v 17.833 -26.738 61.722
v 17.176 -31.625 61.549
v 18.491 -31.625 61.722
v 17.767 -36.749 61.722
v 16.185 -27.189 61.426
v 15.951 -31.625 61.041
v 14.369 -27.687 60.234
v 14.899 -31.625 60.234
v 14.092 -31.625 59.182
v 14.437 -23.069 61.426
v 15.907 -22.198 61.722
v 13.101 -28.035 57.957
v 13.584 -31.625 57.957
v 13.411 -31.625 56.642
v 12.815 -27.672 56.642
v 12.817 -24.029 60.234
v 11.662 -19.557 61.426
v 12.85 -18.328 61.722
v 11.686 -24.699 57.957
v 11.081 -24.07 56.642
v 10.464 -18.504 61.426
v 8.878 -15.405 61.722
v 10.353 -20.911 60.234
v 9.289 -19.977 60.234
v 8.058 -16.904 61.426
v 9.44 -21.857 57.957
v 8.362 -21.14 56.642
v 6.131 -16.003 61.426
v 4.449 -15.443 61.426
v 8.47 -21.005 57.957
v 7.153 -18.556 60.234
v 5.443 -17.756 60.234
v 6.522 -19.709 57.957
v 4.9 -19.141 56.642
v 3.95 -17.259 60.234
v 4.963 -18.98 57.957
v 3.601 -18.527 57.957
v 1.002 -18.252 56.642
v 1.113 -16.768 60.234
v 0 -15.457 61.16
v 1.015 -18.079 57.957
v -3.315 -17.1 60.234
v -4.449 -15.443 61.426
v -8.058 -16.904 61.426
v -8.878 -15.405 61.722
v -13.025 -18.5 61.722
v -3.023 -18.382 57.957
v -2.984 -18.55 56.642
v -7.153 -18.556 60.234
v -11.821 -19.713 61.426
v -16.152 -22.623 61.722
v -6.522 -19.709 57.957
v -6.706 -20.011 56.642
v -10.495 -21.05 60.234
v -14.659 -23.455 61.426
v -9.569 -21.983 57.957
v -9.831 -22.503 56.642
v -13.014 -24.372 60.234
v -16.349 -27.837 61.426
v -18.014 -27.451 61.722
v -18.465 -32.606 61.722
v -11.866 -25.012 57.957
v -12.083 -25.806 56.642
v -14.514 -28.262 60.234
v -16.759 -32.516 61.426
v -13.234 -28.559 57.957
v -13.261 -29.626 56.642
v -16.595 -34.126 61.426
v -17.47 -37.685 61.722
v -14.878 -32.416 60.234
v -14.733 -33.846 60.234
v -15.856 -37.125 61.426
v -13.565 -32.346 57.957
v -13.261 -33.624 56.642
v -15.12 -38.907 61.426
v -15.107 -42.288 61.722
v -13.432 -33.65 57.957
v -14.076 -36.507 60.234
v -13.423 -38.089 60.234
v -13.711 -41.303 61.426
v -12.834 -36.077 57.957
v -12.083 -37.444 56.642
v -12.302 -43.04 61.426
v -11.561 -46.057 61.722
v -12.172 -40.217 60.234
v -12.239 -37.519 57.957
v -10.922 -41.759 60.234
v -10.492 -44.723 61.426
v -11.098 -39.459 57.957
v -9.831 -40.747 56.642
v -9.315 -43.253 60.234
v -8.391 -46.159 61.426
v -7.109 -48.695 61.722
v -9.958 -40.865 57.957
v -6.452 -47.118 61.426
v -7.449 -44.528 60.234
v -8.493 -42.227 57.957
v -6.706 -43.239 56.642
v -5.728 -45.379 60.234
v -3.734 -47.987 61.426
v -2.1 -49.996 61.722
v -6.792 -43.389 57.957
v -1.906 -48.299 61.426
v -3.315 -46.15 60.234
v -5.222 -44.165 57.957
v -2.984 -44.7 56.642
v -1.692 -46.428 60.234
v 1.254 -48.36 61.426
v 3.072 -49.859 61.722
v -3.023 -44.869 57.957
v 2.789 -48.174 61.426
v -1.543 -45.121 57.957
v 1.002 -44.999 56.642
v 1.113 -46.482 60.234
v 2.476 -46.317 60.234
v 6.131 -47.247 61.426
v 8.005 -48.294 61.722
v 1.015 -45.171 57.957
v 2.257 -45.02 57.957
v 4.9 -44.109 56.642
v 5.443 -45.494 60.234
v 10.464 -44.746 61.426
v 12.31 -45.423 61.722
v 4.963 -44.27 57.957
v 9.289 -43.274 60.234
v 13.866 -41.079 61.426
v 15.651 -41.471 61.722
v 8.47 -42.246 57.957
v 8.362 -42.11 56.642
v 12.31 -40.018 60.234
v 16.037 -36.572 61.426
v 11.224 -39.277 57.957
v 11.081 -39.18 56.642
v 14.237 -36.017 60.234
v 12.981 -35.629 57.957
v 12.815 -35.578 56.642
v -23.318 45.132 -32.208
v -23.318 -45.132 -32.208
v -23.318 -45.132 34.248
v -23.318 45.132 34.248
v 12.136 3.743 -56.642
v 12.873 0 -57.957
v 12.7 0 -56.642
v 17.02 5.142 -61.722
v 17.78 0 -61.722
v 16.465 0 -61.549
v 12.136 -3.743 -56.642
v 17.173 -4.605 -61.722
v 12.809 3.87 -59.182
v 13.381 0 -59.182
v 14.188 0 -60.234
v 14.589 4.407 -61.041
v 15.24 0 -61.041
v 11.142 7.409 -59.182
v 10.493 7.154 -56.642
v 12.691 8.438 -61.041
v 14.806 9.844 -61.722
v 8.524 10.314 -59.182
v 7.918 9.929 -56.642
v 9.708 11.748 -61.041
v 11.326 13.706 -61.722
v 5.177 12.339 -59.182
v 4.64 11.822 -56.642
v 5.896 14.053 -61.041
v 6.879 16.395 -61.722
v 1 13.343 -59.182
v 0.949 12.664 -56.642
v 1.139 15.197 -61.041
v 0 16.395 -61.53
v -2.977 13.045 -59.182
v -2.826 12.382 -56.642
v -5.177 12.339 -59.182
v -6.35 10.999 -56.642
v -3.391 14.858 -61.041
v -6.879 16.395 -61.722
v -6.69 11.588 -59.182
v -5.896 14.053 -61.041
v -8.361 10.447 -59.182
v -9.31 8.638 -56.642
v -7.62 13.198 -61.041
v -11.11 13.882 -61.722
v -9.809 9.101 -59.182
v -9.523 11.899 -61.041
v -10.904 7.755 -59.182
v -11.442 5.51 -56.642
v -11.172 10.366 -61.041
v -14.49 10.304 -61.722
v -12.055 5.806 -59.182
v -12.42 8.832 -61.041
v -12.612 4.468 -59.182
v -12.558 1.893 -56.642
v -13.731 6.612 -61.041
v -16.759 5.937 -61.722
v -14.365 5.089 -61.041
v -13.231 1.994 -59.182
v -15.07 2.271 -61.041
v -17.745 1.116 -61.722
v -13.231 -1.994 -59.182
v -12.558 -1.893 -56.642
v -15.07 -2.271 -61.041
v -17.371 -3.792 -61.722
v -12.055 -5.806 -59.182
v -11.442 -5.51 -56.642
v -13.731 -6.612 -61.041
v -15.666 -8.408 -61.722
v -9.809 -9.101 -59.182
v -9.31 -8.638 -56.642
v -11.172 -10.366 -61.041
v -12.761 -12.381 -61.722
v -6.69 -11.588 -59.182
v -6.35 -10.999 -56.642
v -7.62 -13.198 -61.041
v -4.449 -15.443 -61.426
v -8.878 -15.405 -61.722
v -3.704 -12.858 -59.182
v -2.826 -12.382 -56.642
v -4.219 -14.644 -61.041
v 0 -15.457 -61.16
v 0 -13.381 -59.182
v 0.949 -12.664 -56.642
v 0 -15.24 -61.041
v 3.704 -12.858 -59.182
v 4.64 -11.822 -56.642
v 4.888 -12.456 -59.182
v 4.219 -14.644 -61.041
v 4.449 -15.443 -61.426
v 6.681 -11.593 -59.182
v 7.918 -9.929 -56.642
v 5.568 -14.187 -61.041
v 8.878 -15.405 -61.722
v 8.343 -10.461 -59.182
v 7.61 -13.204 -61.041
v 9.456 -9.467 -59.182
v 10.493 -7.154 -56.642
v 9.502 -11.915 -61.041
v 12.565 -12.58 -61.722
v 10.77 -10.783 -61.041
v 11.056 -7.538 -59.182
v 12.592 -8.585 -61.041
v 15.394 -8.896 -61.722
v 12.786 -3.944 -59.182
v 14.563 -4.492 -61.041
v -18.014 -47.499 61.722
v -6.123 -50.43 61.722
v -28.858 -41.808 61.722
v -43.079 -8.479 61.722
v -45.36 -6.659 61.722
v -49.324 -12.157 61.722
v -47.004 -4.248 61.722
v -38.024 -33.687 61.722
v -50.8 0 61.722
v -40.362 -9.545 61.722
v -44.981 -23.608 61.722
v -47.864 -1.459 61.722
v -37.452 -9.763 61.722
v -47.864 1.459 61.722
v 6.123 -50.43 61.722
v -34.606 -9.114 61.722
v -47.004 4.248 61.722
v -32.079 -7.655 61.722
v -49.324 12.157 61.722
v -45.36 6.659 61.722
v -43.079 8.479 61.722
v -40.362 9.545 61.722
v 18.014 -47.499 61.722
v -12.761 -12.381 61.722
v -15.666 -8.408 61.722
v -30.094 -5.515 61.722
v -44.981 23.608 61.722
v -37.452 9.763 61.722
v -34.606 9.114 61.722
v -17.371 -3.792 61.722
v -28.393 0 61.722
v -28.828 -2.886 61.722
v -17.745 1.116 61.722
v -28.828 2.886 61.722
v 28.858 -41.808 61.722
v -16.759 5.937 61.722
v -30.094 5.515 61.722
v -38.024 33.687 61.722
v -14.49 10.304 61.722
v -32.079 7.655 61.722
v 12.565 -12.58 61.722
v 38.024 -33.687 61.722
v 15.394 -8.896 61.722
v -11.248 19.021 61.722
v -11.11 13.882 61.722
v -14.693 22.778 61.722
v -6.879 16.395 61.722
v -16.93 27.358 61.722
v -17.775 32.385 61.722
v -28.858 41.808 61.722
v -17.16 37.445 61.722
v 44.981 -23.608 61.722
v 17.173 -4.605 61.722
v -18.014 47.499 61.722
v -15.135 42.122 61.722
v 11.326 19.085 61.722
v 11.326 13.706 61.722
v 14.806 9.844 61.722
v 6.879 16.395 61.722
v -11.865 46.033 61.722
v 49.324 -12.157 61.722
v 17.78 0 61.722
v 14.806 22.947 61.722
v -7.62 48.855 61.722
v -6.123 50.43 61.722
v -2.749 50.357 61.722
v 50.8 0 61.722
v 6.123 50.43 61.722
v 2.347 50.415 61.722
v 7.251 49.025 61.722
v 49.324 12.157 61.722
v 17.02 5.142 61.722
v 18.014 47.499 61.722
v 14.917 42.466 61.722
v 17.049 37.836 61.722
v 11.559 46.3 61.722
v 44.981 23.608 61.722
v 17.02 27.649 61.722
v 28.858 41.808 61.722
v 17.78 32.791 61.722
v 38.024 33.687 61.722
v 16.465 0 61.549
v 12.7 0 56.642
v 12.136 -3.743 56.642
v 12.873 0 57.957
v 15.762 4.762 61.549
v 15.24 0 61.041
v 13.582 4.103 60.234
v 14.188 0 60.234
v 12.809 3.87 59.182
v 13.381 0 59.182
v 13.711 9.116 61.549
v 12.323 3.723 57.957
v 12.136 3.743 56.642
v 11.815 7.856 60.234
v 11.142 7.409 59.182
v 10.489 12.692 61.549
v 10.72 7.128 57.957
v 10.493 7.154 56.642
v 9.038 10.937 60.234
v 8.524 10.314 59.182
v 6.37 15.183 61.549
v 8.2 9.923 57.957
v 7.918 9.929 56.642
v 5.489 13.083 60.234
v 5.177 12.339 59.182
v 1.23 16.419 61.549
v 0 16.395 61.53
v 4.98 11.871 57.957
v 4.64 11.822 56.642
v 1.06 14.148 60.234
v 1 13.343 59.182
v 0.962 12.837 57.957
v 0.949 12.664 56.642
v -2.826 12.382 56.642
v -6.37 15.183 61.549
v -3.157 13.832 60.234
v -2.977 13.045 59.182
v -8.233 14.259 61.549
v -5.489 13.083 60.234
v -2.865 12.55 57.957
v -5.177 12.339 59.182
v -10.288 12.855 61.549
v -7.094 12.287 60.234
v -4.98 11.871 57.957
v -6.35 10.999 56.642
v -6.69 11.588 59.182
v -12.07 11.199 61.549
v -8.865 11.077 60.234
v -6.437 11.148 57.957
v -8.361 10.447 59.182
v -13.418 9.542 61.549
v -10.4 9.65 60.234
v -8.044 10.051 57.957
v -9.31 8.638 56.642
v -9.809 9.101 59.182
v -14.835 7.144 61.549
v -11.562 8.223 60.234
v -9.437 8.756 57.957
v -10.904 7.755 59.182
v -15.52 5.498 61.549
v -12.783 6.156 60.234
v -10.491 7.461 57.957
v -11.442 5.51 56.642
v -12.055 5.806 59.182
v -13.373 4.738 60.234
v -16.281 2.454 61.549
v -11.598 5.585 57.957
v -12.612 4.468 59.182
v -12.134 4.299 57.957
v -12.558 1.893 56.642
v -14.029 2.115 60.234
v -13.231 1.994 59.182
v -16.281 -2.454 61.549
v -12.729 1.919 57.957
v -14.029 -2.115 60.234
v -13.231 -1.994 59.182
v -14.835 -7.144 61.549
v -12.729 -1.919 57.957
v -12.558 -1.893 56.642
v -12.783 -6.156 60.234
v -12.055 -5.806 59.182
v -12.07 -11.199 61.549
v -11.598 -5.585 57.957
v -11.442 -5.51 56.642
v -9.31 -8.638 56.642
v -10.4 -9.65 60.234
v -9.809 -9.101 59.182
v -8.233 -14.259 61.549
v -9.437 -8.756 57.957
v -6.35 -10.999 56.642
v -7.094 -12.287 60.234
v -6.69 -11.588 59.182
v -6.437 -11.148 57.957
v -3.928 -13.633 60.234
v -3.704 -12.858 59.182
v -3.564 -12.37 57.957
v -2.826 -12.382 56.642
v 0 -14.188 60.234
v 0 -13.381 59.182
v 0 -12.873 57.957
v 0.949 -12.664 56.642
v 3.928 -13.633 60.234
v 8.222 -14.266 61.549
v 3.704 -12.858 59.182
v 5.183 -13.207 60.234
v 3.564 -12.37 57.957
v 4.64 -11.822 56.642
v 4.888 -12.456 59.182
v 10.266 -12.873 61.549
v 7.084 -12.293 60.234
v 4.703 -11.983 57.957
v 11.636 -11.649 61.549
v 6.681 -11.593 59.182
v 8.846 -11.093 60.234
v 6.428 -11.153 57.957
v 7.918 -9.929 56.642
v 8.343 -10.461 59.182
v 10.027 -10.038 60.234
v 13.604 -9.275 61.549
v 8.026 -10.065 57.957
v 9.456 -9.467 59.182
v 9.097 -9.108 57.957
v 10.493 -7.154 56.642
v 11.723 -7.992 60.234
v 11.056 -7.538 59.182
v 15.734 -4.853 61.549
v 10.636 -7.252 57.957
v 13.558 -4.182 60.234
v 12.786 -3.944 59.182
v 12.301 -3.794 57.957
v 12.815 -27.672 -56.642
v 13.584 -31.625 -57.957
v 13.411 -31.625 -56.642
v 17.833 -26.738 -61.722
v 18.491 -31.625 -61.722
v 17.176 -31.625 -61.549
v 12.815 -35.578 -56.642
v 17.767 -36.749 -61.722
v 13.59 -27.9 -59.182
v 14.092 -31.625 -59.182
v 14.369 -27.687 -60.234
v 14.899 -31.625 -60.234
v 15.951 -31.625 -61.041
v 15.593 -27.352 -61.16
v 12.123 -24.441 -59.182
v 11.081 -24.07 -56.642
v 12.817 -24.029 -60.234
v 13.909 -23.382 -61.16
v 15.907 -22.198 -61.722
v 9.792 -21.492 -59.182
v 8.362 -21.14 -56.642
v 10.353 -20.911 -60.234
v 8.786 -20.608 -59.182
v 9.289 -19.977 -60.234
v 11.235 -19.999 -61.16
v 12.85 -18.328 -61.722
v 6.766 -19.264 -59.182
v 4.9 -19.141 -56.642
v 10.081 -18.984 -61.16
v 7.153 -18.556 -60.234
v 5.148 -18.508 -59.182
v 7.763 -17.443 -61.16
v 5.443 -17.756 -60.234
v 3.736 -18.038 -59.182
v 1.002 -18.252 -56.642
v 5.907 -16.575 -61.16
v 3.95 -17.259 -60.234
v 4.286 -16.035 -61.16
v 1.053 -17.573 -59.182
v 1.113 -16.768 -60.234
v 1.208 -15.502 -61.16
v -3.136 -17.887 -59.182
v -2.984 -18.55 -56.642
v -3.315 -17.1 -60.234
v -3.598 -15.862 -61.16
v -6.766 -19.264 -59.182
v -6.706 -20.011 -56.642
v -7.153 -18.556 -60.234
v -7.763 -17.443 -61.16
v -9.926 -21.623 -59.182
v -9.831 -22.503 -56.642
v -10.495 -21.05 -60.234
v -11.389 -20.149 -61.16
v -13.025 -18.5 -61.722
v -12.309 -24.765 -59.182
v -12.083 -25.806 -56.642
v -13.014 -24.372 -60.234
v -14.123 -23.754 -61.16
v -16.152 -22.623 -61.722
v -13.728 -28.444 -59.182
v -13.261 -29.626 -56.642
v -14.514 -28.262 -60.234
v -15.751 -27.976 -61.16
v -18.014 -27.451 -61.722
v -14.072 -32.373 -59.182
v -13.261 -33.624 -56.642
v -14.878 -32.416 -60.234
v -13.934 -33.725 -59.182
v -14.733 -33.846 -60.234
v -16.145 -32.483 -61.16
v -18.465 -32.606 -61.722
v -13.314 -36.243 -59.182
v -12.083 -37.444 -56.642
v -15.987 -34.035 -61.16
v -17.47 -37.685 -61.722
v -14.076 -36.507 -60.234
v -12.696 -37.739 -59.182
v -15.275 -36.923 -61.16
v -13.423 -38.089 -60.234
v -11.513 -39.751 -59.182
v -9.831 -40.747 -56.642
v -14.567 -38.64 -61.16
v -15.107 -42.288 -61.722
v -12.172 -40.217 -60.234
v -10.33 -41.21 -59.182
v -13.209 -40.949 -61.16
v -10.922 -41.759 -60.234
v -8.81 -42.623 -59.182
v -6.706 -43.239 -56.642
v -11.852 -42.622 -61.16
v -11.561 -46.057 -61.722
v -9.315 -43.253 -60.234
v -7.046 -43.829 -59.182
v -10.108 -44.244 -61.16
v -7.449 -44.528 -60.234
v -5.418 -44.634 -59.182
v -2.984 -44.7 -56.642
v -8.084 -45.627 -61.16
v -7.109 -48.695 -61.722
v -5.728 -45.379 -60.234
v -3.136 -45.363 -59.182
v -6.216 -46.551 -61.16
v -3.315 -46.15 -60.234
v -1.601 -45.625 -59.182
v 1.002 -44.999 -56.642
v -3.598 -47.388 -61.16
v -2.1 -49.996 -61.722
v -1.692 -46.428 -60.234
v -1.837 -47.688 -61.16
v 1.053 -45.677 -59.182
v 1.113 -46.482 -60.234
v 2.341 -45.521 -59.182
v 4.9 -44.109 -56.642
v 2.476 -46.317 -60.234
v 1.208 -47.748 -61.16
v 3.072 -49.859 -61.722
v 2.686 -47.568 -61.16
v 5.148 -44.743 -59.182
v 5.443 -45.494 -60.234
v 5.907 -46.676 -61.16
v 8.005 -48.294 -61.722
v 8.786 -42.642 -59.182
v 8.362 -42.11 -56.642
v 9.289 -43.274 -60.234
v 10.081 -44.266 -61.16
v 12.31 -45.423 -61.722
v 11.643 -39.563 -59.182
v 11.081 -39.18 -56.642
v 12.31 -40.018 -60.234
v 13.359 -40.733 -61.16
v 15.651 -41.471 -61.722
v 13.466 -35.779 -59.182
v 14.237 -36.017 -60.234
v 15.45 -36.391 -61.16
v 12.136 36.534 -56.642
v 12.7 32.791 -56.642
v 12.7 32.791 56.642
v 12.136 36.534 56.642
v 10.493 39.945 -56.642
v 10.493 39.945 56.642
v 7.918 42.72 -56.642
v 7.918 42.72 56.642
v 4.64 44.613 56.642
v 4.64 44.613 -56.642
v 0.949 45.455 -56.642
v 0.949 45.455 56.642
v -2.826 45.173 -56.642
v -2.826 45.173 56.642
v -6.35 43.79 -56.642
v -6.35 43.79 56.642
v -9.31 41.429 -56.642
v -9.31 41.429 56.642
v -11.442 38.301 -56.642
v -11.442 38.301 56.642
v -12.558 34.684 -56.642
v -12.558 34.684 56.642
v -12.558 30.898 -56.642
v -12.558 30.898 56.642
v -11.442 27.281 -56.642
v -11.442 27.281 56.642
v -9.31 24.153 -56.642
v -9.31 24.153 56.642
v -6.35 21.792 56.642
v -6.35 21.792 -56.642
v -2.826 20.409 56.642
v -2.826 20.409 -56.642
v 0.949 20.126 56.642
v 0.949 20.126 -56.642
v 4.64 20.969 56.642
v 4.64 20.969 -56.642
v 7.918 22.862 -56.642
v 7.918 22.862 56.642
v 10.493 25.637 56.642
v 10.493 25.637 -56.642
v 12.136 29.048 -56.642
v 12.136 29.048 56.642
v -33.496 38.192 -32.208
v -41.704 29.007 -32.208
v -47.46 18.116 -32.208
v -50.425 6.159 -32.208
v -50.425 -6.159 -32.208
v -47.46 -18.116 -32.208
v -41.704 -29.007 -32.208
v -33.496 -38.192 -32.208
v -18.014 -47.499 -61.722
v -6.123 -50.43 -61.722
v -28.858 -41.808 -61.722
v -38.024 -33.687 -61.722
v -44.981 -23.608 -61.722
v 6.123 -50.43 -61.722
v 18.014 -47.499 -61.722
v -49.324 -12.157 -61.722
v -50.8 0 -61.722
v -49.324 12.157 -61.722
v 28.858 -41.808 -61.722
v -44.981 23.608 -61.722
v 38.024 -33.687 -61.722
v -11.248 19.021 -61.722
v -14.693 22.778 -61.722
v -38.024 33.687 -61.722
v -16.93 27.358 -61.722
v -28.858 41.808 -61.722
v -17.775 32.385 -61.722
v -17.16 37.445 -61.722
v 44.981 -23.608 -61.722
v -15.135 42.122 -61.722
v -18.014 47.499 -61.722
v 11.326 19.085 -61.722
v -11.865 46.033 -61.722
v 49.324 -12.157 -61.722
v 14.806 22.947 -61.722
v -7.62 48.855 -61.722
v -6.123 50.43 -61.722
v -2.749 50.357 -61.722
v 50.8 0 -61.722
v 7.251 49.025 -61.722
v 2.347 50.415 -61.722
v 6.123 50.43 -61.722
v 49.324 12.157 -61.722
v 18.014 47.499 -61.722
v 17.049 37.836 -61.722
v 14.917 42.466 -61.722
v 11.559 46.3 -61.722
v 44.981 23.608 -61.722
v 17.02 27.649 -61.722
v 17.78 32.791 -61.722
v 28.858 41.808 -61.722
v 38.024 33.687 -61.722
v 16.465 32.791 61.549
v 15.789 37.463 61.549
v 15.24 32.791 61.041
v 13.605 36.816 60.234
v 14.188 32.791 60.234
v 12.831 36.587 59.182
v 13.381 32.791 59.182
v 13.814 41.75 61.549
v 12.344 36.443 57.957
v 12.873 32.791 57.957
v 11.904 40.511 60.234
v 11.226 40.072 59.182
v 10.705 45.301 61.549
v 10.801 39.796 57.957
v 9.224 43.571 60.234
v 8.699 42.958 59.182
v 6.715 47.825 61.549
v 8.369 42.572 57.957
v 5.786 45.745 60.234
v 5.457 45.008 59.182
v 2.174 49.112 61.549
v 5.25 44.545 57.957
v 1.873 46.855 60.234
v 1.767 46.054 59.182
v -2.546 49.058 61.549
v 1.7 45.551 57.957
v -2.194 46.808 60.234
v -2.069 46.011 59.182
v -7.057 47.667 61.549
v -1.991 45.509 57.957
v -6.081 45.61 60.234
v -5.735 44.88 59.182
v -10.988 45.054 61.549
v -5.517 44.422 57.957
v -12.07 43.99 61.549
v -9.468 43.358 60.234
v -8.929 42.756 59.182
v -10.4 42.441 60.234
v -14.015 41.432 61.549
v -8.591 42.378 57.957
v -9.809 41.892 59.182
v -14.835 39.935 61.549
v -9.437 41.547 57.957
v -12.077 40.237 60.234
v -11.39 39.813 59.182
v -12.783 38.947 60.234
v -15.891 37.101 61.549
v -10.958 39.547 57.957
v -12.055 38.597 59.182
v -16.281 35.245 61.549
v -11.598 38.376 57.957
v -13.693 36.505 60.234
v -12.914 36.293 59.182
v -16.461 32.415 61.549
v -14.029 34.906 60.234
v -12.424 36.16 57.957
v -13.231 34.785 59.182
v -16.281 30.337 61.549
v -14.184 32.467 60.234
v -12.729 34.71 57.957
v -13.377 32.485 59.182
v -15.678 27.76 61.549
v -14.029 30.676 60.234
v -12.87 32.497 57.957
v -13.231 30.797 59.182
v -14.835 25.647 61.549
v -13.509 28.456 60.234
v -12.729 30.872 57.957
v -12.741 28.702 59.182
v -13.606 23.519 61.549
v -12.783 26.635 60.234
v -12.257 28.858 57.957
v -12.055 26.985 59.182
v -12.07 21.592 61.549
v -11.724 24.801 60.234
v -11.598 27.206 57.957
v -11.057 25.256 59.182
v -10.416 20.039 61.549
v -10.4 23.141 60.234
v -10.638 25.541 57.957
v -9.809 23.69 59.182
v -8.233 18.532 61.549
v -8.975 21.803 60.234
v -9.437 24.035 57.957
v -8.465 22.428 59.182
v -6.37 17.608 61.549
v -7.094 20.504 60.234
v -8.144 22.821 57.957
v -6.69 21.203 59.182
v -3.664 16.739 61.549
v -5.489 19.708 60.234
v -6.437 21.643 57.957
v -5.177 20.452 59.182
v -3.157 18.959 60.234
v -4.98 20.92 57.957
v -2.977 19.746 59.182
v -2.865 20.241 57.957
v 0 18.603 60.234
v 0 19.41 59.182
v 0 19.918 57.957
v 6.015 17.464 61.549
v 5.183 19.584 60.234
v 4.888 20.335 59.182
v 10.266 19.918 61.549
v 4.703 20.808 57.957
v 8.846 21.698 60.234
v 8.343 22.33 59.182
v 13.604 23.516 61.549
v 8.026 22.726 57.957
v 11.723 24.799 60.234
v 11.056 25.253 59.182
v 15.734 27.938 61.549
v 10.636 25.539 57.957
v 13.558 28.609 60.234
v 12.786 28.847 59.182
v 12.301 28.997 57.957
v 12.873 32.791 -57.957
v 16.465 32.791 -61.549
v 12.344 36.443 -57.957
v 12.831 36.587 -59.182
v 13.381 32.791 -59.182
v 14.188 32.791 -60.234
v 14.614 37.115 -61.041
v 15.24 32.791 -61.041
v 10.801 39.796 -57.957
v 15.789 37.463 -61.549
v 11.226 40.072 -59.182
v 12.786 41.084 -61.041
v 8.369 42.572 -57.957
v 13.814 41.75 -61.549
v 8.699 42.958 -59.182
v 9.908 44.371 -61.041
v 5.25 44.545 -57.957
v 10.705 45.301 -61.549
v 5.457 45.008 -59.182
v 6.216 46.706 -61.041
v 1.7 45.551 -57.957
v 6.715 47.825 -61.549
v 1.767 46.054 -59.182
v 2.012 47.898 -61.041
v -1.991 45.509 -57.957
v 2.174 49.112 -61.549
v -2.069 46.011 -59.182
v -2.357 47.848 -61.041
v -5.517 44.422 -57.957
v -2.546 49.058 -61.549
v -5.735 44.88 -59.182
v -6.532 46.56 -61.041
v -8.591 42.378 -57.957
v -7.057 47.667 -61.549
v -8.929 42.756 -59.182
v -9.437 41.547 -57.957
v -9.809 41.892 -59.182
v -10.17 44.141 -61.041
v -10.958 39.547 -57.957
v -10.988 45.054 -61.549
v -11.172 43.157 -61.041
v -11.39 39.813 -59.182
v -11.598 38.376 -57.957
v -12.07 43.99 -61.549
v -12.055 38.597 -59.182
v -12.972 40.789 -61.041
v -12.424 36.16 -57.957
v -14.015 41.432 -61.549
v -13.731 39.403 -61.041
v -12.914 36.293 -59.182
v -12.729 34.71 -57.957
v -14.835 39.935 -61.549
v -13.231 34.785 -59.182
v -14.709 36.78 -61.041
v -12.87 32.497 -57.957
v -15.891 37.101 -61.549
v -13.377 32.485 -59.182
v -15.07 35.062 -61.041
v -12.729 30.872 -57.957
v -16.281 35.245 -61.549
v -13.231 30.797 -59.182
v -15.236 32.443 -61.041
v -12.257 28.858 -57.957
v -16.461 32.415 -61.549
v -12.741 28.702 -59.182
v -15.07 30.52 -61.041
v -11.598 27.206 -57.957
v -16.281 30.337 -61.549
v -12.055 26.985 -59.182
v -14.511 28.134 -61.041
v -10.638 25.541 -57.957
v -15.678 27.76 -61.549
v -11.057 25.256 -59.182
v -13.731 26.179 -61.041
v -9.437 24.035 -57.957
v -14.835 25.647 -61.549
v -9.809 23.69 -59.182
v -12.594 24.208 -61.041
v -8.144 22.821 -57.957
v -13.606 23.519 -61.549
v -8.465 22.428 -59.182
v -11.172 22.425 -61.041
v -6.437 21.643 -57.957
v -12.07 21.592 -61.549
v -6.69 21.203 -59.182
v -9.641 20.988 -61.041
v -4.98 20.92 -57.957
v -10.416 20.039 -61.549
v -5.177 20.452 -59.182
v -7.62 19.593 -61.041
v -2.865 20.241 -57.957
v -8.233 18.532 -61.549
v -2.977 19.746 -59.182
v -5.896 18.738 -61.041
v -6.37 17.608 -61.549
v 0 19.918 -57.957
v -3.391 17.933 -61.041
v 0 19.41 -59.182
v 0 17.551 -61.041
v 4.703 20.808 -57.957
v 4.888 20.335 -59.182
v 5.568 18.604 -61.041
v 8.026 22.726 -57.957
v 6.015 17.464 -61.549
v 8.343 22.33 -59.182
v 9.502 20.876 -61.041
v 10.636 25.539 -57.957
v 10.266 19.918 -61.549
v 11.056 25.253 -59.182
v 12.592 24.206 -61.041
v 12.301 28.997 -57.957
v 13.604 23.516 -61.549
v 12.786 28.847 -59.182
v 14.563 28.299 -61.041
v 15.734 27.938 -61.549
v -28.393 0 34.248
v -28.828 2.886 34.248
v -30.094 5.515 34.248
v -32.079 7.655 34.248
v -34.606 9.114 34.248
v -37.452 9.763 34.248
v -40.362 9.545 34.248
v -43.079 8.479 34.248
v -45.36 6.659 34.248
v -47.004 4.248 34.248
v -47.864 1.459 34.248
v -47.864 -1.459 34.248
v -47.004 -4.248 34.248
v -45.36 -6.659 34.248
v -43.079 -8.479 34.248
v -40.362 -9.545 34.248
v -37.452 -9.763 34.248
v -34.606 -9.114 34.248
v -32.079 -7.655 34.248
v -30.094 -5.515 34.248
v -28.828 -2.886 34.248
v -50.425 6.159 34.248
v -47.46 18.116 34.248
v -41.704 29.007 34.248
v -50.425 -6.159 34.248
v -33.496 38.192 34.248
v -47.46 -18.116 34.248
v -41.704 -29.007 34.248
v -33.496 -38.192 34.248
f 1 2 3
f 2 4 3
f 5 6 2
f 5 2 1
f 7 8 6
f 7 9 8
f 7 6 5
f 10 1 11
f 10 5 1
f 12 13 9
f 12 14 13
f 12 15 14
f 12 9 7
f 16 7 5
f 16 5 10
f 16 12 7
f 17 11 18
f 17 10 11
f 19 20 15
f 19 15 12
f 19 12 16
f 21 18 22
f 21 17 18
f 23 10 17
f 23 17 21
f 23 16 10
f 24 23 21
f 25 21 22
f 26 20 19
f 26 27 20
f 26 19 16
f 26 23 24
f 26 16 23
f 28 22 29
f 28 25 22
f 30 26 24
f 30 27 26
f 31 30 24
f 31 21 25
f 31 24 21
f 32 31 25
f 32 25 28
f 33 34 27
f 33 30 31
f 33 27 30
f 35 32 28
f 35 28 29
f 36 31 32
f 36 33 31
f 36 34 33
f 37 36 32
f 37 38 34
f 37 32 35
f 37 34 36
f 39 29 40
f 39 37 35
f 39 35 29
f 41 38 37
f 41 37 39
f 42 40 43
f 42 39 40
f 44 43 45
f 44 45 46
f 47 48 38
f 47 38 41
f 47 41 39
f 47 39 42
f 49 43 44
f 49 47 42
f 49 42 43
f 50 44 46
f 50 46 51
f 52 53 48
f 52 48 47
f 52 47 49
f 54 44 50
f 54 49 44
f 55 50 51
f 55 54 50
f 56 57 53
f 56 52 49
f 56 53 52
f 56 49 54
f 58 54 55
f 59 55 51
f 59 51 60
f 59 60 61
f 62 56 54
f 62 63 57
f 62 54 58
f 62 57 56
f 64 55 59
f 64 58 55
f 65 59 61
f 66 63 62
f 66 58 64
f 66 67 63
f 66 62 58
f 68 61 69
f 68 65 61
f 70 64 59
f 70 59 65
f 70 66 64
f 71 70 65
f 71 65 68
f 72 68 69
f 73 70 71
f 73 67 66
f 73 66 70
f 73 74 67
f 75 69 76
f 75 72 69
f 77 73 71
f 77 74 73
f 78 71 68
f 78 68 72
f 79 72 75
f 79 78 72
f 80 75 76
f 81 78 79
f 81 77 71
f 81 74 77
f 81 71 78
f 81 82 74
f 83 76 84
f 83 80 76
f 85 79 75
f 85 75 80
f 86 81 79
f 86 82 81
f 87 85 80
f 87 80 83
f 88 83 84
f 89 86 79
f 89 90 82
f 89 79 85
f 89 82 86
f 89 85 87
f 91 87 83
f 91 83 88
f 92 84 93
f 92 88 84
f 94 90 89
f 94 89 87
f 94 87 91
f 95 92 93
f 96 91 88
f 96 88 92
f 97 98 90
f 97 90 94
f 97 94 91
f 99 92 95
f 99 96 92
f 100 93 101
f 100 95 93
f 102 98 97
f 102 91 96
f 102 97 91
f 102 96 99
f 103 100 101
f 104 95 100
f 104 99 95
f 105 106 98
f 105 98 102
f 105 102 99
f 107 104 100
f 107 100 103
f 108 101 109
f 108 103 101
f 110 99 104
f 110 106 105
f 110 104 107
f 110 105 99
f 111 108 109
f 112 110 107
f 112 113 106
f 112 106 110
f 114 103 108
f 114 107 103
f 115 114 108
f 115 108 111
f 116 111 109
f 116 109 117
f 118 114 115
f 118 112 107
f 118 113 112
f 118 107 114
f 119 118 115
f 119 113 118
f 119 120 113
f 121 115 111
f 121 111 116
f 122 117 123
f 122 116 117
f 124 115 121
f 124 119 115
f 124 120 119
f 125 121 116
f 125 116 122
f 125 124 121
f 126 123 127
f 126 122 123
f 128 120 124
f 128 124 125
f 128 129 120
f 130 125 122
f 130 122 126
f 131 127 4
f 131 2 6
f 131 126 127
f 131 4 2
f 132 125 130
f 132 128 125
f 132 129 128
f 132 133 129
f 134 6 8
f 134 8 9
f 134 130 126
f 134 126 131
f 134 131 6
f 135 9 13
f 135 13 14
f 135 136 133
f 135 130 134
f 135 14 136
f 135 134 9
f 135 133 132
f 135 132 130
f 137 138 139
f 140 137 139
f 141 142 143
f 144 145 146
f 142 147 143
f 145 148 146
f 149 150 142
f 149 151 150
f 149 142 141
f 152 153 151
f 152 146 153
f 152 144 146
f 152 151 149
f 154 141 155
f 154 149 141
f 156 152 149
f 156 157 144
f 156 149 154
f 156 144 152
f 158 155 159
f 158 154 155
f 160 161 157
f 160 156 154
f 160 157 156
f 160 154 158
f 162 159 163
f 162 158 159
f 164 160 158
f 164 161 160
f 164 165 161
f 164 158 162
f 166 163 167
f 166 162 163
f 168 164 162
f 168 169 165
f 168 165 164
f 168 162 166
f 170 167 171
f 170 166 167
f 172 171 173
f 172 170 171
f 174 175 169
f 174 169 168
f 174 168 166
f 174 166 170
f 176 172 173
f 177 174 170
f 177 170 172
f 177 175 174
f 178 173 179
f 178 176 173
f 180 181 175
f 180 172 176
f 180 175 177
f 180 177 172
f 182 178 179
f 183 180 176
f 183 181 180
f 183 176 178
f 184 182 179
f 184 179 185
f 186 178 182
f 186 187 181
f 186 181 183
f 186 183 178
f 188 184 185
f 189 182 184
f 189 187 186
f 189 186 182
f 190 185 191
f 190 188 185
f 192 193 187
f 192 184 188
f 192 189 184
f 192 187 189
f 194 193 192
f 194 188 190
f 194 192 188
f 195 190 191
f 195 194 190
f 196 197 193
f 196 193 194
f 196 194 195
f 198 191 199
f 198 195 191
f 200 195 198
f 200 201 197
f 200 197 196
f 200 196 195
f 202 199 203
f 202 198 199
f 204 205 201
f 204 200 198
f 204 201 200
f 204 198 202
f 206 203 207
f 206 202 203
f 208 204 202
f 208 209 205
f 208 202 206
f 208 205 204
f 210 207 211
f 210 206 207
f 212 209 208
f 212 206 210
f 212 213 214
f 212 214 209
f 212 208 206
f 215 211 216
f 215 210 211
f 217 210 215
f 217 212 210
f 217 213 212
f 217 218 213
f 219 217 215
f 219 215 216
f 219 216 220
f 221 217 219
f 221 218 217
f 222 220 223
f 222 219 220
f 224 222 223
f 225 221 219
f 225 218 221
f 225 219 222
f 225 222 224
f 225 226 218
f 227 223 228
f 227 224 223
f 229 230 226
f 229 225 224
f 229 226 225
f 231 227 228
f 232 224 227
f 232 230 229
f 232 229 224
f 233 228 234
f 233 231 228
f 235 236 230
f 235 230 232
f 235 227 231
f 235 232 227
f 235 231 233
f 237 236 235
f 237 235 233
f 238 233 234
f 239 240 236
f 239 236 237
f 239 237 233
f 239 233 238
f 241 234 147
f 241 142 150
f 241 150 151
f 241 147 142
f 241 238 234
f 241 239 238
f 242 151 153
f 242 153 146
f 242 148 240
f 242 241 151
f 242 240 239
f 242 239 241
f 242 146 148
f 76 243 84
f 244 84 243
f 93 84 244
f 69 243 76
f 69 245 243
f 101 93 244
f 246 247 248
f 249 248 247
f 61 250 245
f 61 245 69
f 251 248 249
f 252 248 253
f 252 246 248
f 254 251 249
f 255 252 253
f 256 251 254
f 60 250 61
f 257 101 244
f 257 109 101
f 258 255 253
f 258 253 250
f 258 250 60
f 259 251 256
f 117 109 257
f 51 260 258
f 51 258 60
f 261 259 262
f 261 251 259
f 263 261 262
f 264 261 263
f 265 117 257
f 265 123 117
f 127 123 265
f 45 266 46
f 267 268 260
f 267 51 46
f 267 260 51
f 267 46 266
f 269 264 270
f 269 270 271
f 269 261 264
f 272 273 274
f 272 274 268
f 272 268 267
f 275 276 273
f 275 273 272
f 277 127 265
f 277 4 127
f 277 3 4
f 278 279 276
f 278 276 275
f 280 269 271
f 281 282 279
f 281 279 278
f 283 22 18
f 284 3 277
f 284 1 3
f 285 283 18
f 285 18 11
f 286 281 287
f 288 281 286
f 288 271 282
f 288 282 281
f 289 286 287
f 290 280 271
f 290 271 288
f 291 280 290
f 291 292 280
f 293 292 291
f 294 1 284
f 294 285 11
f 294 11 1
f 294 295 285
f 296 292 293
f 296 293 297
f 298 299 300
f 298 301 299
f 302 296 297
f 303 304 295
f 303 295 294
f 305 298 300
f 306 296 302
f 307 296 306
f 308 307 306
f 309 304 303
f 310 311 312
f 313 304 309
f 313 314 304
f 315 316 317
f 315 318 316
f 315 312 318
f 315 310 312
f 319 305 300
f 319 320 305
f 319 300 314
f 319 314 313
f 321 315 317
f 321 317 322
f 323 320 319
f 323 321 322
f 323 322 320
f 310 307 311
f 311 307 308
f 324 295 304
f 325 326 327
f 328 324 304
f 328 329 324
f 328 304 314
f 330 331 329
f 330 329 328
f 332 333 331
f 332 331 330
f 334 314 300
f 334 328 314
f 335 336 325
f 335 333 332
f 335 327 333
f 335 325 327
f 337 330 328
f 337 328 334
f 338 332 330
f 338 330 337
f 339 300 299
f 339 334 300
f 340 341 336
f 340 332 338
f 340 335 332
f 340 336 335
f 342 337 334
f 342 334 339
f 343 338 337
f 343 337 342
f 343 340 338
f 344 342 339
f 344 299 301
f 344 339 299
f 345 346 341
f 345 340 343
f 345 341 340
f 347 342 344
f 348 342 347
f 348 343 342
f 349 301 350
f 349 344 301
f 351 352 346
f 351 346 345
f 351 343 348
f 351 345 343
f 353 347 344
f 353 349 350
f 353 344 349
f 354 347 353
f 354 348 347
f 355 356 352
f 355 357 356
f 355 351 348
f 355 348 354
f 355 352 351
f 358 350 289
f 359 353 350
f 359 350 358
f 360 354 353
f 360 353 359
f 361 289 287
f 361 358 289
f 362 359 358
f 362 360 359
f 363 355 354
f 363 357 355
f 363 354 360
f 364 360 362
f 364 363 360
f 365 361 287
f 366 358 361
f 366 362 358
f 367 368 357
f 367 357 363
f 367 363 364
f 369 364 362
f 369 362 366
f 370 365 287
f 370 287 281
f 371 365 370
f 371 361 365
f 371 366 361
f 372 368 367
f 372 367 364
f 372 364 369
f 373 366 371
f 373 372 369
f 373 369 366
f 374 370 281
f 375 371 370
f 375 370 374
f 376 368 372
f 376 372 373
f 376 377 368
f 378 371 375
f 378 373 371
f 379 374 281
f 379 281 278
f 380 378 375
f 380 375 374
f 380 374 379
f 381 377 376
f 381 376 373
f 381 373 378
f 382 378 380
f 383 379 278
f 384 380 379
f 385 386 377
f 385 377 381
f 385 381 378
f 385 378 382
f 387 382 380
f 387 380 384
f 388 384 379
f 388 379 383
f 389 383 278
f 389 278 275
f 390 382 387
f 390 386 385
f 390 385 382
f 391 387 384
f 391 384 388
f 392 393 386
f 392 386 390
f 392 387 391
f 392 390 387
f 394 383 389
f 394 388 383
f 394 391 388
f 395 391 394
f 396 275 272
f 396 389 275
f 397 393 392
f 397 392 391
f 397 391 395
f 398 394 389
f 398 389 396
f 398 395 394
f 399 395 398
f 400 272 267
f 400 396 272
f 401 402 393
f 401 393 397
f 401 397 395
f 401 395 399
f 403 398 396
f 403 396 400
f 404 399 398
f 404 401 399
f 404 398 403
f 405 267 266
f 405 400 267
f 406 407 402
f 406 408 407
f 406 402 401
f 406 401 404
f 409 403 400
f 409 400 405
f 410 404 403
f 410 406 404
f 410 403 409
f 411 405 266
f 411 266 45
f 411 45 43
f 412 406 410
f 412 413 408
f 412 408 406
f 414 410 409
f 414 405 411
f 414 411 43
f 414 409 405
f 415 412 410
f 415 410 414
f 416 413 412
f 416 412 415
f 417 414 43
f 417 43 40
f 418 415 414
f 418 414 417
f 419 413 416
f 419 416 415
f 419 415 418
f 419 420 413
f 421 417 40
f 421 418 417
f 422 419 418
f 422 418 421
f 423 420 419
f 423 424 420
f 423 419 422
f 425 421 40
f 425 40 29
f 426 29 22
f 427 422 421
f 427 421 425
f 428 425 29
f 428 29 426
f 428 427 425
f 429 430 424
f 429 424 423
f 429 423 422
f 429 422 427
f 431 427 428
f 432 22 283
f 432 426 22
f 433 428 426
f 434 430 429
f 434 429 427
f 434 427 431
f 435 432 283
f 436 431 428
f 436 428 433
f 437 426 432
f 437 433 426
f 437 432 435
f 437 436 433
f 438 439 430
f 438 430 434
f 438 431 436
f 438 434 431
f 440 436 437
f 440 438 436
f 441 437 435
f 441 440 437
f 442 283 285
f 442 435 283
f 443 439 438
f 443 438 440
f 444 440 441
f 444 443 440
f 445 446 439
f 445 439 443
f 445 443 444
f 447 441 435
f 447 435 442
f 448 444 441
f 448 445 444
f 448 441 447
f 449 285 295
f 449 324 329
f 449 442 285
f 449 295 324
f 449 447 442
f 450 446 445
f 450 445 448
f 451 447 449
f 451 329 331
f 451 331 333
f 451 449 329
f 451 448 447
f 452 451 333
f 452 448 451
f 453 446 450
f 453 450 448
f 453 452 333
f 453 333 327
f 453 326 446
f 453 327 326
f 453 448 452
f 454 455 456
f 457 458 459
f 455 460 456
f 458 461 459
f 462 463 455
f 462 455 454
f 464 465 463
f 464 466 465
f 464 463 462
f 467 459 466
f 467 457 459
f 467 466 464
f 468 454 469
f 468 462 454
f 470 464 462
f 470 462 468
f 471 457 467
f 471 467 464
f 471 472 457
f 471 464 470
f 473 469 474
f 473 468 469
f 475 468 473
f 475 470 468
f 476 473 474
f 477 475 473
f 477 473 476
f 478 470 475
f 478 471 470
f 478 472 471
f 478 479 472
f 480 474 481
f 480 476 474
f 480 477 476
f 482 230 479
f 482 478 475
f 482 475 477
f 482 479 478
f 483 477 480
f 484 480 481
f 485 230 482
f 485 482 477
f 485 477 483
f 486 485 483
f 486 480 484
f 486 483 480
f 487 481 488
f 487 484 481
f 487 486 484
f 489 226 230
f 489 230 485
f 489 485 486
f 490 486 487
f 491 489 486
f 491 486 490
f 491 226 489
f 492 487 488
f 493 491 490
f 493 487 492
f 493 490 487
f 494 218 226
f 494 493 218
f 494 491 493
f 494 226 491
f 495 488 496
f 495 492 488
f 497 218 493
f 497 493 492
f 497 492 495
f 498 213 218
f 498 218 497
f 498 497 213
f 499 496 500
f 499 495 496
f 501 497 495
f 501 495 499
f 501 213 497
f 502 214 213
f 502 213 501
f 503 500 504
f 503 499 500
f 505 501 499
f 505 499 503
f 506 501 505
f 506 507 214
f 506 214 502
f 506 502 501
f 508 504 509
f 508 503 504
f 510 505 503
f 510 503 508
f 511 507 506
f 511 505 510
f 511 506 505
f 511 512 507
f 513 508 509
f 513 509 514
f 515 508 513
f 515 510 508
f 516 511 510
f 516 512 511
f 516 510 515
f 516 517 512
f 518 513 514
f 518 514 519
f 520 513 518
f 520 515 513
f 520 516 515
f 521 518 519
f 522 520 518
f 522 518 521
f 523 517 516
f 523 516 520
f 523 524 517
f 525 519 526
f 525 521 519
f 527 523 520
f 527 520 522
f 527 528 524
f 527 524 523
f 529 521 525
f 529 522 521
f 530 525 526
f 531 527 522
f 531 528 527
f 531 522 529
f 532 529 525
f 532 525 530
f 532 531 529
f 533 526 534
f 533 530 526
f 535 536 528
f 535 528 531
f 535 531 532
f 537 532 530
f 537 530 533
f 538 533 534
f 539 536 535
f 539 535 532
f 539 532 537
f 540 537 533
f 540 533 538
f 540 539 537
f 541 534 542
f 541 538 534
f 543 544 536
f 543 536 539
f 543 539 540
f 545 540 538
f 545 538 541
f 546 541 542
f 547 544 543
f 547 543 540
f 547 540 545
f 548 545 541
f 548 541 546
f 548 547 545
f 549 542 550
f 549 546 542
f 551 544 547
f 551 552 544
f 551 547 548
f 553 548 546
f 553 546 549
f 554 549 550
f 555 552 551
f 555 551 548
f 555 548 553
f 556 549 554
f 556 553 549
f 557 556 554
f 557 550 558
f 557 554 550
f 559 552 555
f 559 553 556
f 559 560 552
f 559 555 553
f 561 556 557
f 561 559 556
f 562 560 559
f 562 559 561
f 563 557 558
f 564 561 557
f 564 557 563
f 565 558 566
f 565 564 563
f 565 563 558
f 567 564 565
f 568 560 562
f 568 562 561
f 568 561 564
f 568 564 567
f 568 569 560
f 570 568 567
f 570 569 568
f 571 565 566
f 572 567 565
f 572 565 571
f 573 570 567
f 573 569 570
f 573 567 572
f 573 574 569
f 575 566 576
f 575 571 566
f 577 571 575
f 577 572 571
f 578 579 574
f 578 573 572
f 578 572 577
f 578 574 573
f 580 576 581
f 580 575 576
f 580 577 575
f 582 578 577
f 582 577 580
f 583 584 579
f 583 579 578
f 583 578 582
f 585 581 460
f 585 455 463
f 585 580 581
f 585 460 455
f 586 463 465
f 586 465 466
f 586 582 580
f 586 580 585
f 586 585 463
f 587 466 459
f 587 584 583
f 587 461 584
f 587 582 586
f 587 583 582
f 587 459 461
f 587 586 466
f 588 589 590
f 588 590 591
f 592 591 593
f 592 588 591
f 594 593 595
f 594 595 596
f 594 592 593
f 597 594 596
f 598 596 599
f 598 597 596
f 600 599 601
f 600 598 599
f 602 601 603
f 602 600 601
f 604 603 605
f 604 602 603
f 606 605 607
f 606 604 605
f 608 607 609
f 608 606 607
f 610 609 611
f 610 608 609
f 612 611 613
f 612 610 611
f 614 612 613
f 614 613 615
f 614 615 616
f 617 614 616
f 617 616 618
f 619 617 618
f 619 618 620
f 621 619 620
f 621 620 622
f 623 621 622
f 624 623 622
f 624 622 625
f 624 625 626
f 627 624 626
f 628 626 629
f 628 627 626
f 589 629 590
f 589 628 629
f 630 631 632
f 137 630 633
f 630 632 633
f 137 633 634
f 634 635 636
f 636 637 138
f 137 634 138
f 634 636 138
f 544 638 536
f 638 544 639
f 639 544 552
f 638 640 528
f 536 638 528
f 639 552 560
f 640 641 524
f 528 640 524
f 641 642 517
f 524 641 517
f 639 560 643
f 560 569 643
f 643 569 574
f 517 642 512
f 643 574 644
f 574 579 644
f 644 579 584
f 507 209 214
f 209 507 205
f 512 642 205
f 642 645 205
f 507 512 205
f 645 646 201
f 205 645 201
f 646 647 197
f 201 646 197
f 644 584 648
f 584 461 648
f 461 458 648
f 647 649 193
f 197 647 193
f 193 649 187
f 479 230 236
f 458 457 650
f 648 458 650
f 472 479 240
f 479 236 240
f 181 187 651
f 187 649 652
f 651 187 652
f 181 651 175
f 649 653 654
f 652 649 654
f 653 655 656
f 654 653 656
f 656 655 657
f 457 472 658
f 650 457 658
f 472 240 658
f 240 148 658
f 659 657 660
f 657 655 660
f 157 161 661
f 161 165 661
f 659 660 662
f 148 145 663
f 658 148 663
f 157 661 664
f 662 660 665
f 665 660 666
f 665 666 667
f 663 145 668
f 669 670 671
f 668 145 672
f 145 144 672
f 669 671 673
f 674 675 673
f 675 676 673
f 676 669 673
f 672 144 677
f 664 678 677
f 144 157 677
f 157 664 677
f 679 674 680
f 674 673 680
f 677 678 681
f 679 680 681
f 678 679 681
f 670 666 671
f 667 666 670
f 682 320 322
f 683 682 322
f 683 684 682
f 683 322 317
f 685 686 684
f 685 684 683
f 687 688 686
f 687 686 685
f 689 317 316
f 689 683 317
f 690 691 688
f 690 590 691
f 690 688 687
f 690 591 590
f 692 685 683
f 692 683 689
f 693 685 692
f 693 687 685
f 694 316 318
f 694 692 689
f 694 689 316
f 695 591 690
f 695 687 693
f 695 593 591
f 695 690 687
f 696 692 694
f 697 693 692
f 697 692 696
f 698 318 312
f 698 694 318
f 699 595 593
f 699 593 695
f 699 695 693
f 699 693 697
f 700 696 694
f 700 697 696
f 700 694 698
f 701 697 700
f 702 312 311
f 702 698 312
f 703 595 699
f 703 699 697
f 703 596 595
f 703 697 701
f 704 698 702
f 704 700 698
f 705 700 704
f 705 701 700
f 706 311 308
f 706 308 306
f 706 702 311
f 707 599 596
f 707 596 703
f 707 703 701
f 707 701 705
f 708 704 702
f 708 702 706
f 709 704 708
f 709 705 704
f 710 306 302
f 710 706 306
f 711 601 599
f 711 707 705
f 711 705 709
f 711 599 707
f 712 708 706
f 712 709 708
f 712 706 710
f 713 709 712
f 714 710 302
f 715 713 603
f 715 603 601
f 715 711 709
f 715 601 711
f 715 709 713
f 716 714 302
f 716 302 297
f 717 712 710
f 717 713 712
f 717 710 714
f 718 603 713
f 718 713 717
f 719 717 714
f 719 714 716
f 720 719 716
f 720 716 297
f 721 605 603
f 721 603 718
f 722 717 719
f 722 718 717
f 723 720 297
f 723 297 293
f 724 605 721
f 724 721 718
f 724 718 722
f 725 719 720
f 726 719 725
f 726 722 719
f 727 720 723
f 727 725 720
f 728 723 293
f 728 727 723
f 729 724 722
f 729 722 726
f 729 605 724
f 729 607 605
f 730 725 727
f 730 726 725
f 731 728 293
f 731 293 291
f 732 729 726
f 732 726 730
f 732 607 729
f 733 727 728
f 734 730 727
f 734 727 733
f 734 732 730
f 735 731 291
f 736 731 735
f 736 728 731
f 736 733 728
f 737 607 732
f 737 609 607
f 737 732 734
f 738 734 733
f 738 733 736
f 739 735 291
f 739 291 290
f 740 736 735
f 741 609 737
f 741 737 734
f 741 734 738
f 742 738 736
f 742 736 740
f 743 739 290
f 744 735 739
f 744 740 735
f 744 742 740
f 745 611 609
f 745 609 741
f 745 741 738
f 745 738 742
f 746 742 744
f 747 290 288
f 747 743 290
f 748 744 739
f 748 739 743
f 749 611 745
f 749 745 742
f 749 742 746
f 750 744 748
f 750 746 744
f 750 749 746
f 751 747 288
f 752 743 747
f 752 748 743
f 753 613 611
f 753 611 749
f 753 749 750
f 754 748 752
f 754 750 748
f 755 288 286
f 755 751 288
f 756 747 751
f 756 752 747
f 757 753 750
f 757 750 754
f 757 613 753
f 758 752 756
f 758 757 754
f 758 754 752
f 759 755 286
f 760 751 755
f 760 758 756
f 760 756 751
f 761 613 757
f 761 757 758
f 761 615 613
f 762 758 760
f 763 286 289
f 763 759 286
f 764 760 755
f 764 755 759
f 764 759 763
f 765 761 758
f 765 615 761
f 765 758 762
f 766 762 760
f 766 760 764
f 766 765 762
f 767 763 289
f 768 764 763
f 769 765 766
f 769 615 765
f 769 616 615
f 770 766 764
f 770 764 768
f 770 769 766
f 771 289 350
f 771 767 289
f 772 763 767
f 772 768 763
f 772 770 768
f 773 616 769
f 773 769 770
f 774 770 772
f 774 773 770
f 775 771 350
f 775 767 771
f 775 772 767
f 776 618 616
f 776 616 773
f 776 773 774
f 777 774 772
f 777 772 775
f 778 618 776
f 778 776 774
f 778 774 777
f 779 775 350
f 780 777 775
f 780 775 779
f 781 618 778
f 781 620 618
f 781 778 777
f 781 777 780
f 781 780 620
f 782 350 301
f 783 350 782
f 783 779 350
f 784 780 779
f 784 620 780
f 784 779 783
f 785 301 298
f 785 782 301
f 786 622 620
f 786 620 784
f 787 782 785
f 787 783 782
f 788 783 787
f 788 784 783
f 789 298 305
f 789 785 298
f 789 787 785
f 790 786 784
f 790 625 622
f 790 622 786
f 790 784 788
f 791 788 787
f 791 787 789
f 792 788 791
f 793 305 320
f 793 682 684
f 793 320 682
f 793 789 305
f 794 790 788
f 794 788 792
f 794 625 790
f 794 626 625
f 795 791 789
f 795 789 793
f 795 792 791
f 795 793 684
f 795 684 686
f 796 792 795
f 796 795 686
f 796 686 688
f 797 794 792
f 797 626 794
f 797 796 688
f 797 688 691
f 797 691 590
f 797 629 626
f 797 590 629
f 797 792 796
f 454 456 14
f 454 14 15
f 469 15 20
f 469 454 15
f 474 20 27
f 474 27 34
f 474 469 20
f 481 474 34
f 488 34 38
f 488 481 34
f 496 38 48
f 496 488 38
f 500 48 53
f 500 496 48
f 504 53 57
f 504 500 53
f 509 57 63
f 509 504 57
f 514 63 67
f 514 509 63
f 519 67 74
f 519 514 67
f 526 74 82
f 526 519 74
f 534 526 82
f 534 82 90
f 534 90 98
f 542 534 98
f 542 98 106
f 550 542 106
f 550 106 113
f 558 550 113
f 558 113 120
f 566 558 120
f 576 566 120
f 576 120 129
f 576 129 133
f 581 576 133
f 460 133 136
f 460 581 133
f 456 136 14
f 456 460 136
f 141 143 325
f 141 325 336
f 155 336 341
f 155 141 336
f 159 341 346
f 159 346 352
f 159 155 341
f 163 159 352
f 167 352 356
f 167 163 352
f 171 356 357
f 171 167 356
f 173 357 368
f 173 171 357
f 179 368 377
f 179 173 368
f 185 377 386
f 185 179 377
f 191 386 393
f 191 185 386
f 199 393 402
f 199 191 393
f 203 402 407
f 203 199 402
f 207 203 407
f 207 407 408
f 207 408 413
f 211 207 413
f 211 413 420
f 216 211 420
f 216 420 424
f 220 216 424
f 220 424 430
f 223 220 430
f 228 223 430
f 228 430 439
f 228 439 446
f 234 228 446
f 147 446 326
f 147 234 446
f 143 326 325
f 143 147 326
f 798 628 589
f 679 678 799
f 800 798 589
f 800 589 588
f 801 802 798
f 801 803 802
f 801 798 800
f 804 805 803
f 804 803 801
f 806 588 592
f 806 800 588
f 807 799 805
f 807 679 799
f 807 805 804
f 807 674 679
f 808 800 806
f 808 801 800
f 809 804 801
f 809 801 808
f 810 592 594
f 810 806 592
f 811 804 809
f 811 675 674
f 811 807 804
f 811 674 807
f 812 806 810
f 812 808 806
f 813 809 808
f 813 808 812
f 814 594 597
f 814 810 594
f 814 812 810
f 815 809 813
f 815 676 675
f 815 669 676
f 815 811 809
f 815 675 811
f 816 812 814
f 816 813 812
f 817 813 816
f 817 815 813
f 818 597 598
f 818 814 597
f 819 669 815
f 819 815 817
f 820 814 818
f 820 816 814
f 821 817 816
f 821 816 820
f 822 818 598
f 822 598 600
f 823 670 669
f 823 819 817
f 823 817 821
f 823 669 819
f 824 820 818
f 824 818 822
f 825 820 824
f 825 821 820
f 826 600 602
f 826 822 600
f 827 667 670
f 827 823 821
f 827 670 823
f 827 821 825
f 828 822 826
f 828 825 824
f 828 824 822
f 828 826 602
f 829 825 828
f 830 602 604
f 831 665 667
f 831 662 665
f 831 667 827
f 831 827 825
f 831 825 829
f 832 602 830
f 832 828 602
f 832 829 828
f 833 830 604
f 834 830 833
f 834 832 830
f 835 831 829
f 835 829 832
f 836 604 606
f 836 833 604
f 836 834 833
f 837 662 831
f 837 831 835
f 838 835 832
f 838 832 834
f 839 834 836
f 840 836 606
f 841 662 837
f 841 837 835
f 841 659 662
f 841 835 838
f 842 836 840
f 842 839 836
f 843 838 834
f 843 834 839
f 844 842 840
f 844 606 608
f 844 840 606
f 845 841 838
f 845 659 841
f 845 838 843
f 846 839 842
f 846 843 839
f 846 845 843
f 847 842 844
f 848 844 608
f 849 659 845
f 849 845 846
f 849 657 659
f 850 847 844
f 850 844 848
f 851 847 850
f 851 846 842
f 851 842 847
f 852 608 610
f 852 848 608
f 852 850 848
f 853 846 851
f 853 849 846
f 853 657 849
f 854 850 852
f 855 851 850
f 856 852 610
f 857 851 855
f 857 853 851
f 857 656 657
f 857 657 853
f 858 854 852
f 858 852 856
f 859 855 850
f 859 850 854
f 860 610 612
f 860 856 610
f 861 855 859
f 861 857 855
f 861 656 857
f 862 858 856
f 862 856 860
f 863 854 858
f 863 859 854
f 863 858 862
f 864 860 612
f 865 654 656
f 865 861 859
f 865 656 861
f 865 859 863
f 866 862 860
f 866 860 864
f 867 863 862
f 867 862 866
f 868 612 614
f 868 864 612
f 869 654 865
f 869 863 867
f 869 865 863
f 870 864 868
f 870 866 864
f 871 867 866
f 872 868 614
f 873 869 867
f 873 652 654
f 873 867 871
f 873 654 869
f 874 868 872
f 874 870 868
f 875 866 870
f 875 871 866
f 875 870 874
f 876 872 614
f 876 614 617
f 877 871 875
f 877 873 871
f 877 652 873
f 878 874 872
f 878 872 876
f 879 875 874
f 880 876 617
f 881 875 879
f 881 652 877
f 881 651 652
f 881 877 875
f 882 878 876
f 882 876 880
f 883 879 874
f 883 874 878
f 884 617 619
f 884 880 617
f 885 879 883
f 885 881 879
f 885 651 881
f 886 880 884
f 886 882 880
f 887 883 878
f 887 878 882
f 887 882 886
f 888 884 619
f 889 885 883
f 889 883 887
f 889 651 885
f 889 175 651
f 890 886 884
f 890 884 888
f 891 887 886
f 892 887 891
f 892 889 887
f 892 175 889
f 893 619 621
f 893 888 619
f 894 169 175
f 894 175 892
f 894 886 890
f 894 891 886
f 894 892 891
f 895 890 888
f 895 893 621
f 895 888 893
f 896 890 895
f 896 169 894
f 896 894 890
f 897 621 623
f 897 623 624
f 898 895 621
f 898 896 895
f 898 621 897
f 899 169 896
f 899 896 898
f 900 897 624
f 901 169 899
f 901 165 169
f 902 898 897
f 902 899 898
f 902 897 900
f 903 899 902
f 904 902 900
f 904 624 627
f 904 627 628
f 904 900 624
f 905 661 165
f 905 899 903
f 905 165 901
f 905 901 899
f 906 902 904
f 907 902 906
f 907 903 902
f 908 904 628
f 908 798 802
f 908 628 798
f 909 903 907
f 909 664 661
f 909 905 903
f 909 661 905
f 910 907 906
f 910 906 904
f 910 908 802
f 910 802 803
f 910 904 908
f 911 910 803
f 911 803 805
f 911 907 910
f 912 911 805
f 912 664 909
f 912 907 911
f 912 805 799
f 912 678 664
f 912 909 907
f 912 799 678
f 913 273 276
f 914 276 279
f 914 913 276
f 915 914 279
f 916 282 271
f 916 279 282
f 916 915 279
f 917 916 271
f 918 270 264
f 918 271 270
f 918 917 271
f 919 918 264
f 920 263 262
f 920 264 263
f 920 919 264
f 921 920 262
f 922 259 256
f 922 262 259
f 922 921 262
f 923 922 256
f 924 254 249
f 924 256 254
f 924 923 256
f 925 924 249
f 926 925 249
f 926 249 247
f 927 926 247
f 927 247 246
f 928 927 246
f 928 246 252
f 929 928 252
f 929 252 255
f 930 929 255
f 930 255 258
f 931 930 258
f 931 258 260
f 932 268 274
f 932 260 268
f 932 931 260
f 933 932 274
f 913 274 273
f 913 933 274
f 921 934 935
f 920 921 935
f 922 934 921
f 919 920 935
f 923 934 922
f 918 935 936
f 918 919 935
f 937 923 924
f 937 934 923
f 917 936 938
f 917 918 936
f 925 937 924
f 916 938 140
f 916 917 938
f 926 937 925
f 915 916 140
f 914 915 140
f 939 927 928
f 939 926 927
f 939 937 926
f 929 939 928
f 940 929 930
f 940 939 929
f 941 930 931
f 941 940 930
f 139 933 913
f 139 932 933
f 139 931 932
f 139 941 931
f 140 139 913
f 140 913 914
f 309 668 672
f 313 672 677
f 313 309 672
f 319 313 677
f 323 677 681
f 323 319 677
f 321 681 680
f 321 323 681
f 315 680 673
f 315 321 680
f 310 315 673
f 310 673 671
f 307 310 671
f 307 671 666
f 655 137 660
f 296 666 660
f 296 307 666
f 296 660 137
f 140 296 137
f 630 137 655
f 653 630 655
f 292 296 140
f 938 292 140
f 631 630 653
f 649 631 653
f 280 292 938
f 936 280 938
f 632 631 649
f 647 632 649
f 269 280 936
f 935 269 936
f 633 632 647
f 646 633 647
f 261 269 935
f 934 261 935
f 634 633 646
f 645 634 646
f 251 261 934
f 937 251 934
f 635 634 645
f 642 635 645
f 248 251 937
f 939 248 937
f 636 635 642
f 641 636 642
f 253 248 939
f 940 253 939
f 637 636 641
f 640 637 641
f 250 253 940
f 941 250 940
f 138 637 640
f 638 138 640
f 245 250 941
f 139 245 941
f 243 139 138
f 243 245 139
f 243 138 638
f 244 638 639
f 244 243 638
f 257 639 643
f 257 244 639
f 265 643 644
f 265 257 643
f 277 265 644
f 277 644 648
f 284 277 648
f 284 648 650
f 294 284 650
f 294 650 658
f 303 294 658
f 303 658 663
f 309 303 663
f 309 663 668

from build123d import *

# Parameters (mm, degrees)
F0_R     = 50.8
F0_R_2   = 13.4110362239
F0_R_3   = 12.7
F1_DEPTH = 61.722
F3_W     = 62.9586838186
F3_H     = 66.4563924074
F4_DEPTH = 93.98
F5_R     = 9.7904939915
F6_DEPTH = 90.17


# Not quite as in the source:
# - a fillet or chamfer that OpenCascade refuses, or shapes differently, is made with other operations: its cross-section is extruded or revolved along the edge and cut away or added


with BuildPart() as f1:
    # F0 (on Top) → F1 (new body, symmetric)
    with BuildSketch(Plane.XY):
        Circle(F0_R)
        with Locations((0, -31.6250808537)):
            Circle(F0_R_2, mode=Mode.SUBTRACT)
        Circle(F0_R_3, mode=Mode.SUBTRACT)
        with Locations((0, 32.7909812331)):
            Circle(F0_R_3, mode=Mode.SUBTRACT)
    extrude(amount=F1_DEPTH, both=True)

    # F2: fillet of radius 5.08 on 9 edges, made by hand

    # F2_s1 → F2_t2 (revolve, cut)
    with BuildSketch(Plane.XZ.offset(31.6250808537)):
        with BuildLine():
            ThreePointArc((18.4910362239, 61.722), (14.8989337755, 60.2341024484), (13.4110362239, 56.642))
            Line((13.4110362239, 56.642), (13.4110362239, 61.722))
            Line((13.4110362239, 61.722), (18.4910362239, 61.722))
        make_face()
    revolve(axis=Axis((0, -31.6250808537, 61.722), (0, 0, 1)), mode=Mode.SUBTRACT)

    # F2_s3 → F2_t4 (revolve, cut)
    with BuildSketch(Plane.XZ.offset(31.6250808537)):
        with BuildLine():
            ThreePointArc((13.4110362239, -56.642), (14.8989337755, -60.2341024484), (18.4910362239, -61.722))
            Line((18.4910362239, -61.722), (13.4110362239, -61.722))
            Line((13.4110362239, -61.722), (13.4110362239, -56.642))
        make_face()
    revolve(axis=Axis((0, -31.6250808537, -61.722), (0, 0, 1)), mode=Mode.SUBTRACT)

    # F2_s5 → F2_t6 (revolve, cut)
    with BuildSketch(Plane.XZ):
        with BuildLine():
            ThreePointArc((17.78, 61.722), (14.1878975516, 60.2341024484), (12.7, 56.642))
            Line((12.7, 56.642), (12.7, 61.722))
            Line((12.7, 61.722), (17.78, 61.722))
        make_face()
    revolve(axis=Axis((0, 0, 61.722), (0, 0, 1)), mode=Mode.SUBTRACT)

    # F2_s7 → F2_t8 (revolve, cut)
    with BuildSketch(Plane.XZ):
        with BuildLine():
            ThreePointArc((12.7, -56.642), (14.1878975516, -60.2341024484), (17.78, -61.722))
            Line((17.78, -61.722), (12.7, -61.722))
            Line((12.7, -61.722), (12.7, -56.642))
        make_face()
    revolve(axis=Axis((0, 0, -61.722), (0, 0, 1)), mode=Mode.SUBTRACT)

    # F2_s9 → F2_t10 (revolve, cut)
    with BuildSketch(Plane.XZ.offset(-32.7909812331)):
        with BuildLine():
            ThreePointArc((17.78, 61.722), (14.1878975516, 60.2341024484), (12.7, 56.642))
            Line((12.7, 56.642), (12.7, 61.722))
            Line((12.7, 61.722), (17.78, 61.722))
        make_face()
    revolve(axis=Axis((0, 32.7909812331, 61.722), (0, 0, 1)), mode=Mode.SUBTRACT)

    # F2_s11 → F2_t12 (revolve, cut)
    with BuildSketch(Plane.XZ.offset(-32.7909812331)):
        with BuildLine():
            ThreePointArc((12.7, -56.642), (14.1878975516, -60.2341024484), (17.78, -61.722))
            Line((17.78, -61.722), (12.7, -61.722))
            Line((12.7, -61.722), (12.7, -56.642))
        make_face()
    revolve(axis=Axis((0, 32.7909812331, -61.722), (0, 0, 1)), mode=Mode.SUBTRACT)

    # F3 (on Front) → F4 (cut, symmetric)
    with BuildSketch(Plane.XZ):
        with Locations((-54.7973755747, 1.0201632977)):
            Rectangle(F3_W, F3_H)
    extrude(amount=F4_DEPTH, both=True, mode=Mode.SUBTRACT)

    # F5 (on Top) → F6 (cut)
    with BuildSketch(Plane.XY):
        with Locations((-38.1832793355, 0)):
            Circle(F5_R)
    extrude(amount=F6_DEPTH, mode=Mode.SUBTRACT)


solid = f1.part
